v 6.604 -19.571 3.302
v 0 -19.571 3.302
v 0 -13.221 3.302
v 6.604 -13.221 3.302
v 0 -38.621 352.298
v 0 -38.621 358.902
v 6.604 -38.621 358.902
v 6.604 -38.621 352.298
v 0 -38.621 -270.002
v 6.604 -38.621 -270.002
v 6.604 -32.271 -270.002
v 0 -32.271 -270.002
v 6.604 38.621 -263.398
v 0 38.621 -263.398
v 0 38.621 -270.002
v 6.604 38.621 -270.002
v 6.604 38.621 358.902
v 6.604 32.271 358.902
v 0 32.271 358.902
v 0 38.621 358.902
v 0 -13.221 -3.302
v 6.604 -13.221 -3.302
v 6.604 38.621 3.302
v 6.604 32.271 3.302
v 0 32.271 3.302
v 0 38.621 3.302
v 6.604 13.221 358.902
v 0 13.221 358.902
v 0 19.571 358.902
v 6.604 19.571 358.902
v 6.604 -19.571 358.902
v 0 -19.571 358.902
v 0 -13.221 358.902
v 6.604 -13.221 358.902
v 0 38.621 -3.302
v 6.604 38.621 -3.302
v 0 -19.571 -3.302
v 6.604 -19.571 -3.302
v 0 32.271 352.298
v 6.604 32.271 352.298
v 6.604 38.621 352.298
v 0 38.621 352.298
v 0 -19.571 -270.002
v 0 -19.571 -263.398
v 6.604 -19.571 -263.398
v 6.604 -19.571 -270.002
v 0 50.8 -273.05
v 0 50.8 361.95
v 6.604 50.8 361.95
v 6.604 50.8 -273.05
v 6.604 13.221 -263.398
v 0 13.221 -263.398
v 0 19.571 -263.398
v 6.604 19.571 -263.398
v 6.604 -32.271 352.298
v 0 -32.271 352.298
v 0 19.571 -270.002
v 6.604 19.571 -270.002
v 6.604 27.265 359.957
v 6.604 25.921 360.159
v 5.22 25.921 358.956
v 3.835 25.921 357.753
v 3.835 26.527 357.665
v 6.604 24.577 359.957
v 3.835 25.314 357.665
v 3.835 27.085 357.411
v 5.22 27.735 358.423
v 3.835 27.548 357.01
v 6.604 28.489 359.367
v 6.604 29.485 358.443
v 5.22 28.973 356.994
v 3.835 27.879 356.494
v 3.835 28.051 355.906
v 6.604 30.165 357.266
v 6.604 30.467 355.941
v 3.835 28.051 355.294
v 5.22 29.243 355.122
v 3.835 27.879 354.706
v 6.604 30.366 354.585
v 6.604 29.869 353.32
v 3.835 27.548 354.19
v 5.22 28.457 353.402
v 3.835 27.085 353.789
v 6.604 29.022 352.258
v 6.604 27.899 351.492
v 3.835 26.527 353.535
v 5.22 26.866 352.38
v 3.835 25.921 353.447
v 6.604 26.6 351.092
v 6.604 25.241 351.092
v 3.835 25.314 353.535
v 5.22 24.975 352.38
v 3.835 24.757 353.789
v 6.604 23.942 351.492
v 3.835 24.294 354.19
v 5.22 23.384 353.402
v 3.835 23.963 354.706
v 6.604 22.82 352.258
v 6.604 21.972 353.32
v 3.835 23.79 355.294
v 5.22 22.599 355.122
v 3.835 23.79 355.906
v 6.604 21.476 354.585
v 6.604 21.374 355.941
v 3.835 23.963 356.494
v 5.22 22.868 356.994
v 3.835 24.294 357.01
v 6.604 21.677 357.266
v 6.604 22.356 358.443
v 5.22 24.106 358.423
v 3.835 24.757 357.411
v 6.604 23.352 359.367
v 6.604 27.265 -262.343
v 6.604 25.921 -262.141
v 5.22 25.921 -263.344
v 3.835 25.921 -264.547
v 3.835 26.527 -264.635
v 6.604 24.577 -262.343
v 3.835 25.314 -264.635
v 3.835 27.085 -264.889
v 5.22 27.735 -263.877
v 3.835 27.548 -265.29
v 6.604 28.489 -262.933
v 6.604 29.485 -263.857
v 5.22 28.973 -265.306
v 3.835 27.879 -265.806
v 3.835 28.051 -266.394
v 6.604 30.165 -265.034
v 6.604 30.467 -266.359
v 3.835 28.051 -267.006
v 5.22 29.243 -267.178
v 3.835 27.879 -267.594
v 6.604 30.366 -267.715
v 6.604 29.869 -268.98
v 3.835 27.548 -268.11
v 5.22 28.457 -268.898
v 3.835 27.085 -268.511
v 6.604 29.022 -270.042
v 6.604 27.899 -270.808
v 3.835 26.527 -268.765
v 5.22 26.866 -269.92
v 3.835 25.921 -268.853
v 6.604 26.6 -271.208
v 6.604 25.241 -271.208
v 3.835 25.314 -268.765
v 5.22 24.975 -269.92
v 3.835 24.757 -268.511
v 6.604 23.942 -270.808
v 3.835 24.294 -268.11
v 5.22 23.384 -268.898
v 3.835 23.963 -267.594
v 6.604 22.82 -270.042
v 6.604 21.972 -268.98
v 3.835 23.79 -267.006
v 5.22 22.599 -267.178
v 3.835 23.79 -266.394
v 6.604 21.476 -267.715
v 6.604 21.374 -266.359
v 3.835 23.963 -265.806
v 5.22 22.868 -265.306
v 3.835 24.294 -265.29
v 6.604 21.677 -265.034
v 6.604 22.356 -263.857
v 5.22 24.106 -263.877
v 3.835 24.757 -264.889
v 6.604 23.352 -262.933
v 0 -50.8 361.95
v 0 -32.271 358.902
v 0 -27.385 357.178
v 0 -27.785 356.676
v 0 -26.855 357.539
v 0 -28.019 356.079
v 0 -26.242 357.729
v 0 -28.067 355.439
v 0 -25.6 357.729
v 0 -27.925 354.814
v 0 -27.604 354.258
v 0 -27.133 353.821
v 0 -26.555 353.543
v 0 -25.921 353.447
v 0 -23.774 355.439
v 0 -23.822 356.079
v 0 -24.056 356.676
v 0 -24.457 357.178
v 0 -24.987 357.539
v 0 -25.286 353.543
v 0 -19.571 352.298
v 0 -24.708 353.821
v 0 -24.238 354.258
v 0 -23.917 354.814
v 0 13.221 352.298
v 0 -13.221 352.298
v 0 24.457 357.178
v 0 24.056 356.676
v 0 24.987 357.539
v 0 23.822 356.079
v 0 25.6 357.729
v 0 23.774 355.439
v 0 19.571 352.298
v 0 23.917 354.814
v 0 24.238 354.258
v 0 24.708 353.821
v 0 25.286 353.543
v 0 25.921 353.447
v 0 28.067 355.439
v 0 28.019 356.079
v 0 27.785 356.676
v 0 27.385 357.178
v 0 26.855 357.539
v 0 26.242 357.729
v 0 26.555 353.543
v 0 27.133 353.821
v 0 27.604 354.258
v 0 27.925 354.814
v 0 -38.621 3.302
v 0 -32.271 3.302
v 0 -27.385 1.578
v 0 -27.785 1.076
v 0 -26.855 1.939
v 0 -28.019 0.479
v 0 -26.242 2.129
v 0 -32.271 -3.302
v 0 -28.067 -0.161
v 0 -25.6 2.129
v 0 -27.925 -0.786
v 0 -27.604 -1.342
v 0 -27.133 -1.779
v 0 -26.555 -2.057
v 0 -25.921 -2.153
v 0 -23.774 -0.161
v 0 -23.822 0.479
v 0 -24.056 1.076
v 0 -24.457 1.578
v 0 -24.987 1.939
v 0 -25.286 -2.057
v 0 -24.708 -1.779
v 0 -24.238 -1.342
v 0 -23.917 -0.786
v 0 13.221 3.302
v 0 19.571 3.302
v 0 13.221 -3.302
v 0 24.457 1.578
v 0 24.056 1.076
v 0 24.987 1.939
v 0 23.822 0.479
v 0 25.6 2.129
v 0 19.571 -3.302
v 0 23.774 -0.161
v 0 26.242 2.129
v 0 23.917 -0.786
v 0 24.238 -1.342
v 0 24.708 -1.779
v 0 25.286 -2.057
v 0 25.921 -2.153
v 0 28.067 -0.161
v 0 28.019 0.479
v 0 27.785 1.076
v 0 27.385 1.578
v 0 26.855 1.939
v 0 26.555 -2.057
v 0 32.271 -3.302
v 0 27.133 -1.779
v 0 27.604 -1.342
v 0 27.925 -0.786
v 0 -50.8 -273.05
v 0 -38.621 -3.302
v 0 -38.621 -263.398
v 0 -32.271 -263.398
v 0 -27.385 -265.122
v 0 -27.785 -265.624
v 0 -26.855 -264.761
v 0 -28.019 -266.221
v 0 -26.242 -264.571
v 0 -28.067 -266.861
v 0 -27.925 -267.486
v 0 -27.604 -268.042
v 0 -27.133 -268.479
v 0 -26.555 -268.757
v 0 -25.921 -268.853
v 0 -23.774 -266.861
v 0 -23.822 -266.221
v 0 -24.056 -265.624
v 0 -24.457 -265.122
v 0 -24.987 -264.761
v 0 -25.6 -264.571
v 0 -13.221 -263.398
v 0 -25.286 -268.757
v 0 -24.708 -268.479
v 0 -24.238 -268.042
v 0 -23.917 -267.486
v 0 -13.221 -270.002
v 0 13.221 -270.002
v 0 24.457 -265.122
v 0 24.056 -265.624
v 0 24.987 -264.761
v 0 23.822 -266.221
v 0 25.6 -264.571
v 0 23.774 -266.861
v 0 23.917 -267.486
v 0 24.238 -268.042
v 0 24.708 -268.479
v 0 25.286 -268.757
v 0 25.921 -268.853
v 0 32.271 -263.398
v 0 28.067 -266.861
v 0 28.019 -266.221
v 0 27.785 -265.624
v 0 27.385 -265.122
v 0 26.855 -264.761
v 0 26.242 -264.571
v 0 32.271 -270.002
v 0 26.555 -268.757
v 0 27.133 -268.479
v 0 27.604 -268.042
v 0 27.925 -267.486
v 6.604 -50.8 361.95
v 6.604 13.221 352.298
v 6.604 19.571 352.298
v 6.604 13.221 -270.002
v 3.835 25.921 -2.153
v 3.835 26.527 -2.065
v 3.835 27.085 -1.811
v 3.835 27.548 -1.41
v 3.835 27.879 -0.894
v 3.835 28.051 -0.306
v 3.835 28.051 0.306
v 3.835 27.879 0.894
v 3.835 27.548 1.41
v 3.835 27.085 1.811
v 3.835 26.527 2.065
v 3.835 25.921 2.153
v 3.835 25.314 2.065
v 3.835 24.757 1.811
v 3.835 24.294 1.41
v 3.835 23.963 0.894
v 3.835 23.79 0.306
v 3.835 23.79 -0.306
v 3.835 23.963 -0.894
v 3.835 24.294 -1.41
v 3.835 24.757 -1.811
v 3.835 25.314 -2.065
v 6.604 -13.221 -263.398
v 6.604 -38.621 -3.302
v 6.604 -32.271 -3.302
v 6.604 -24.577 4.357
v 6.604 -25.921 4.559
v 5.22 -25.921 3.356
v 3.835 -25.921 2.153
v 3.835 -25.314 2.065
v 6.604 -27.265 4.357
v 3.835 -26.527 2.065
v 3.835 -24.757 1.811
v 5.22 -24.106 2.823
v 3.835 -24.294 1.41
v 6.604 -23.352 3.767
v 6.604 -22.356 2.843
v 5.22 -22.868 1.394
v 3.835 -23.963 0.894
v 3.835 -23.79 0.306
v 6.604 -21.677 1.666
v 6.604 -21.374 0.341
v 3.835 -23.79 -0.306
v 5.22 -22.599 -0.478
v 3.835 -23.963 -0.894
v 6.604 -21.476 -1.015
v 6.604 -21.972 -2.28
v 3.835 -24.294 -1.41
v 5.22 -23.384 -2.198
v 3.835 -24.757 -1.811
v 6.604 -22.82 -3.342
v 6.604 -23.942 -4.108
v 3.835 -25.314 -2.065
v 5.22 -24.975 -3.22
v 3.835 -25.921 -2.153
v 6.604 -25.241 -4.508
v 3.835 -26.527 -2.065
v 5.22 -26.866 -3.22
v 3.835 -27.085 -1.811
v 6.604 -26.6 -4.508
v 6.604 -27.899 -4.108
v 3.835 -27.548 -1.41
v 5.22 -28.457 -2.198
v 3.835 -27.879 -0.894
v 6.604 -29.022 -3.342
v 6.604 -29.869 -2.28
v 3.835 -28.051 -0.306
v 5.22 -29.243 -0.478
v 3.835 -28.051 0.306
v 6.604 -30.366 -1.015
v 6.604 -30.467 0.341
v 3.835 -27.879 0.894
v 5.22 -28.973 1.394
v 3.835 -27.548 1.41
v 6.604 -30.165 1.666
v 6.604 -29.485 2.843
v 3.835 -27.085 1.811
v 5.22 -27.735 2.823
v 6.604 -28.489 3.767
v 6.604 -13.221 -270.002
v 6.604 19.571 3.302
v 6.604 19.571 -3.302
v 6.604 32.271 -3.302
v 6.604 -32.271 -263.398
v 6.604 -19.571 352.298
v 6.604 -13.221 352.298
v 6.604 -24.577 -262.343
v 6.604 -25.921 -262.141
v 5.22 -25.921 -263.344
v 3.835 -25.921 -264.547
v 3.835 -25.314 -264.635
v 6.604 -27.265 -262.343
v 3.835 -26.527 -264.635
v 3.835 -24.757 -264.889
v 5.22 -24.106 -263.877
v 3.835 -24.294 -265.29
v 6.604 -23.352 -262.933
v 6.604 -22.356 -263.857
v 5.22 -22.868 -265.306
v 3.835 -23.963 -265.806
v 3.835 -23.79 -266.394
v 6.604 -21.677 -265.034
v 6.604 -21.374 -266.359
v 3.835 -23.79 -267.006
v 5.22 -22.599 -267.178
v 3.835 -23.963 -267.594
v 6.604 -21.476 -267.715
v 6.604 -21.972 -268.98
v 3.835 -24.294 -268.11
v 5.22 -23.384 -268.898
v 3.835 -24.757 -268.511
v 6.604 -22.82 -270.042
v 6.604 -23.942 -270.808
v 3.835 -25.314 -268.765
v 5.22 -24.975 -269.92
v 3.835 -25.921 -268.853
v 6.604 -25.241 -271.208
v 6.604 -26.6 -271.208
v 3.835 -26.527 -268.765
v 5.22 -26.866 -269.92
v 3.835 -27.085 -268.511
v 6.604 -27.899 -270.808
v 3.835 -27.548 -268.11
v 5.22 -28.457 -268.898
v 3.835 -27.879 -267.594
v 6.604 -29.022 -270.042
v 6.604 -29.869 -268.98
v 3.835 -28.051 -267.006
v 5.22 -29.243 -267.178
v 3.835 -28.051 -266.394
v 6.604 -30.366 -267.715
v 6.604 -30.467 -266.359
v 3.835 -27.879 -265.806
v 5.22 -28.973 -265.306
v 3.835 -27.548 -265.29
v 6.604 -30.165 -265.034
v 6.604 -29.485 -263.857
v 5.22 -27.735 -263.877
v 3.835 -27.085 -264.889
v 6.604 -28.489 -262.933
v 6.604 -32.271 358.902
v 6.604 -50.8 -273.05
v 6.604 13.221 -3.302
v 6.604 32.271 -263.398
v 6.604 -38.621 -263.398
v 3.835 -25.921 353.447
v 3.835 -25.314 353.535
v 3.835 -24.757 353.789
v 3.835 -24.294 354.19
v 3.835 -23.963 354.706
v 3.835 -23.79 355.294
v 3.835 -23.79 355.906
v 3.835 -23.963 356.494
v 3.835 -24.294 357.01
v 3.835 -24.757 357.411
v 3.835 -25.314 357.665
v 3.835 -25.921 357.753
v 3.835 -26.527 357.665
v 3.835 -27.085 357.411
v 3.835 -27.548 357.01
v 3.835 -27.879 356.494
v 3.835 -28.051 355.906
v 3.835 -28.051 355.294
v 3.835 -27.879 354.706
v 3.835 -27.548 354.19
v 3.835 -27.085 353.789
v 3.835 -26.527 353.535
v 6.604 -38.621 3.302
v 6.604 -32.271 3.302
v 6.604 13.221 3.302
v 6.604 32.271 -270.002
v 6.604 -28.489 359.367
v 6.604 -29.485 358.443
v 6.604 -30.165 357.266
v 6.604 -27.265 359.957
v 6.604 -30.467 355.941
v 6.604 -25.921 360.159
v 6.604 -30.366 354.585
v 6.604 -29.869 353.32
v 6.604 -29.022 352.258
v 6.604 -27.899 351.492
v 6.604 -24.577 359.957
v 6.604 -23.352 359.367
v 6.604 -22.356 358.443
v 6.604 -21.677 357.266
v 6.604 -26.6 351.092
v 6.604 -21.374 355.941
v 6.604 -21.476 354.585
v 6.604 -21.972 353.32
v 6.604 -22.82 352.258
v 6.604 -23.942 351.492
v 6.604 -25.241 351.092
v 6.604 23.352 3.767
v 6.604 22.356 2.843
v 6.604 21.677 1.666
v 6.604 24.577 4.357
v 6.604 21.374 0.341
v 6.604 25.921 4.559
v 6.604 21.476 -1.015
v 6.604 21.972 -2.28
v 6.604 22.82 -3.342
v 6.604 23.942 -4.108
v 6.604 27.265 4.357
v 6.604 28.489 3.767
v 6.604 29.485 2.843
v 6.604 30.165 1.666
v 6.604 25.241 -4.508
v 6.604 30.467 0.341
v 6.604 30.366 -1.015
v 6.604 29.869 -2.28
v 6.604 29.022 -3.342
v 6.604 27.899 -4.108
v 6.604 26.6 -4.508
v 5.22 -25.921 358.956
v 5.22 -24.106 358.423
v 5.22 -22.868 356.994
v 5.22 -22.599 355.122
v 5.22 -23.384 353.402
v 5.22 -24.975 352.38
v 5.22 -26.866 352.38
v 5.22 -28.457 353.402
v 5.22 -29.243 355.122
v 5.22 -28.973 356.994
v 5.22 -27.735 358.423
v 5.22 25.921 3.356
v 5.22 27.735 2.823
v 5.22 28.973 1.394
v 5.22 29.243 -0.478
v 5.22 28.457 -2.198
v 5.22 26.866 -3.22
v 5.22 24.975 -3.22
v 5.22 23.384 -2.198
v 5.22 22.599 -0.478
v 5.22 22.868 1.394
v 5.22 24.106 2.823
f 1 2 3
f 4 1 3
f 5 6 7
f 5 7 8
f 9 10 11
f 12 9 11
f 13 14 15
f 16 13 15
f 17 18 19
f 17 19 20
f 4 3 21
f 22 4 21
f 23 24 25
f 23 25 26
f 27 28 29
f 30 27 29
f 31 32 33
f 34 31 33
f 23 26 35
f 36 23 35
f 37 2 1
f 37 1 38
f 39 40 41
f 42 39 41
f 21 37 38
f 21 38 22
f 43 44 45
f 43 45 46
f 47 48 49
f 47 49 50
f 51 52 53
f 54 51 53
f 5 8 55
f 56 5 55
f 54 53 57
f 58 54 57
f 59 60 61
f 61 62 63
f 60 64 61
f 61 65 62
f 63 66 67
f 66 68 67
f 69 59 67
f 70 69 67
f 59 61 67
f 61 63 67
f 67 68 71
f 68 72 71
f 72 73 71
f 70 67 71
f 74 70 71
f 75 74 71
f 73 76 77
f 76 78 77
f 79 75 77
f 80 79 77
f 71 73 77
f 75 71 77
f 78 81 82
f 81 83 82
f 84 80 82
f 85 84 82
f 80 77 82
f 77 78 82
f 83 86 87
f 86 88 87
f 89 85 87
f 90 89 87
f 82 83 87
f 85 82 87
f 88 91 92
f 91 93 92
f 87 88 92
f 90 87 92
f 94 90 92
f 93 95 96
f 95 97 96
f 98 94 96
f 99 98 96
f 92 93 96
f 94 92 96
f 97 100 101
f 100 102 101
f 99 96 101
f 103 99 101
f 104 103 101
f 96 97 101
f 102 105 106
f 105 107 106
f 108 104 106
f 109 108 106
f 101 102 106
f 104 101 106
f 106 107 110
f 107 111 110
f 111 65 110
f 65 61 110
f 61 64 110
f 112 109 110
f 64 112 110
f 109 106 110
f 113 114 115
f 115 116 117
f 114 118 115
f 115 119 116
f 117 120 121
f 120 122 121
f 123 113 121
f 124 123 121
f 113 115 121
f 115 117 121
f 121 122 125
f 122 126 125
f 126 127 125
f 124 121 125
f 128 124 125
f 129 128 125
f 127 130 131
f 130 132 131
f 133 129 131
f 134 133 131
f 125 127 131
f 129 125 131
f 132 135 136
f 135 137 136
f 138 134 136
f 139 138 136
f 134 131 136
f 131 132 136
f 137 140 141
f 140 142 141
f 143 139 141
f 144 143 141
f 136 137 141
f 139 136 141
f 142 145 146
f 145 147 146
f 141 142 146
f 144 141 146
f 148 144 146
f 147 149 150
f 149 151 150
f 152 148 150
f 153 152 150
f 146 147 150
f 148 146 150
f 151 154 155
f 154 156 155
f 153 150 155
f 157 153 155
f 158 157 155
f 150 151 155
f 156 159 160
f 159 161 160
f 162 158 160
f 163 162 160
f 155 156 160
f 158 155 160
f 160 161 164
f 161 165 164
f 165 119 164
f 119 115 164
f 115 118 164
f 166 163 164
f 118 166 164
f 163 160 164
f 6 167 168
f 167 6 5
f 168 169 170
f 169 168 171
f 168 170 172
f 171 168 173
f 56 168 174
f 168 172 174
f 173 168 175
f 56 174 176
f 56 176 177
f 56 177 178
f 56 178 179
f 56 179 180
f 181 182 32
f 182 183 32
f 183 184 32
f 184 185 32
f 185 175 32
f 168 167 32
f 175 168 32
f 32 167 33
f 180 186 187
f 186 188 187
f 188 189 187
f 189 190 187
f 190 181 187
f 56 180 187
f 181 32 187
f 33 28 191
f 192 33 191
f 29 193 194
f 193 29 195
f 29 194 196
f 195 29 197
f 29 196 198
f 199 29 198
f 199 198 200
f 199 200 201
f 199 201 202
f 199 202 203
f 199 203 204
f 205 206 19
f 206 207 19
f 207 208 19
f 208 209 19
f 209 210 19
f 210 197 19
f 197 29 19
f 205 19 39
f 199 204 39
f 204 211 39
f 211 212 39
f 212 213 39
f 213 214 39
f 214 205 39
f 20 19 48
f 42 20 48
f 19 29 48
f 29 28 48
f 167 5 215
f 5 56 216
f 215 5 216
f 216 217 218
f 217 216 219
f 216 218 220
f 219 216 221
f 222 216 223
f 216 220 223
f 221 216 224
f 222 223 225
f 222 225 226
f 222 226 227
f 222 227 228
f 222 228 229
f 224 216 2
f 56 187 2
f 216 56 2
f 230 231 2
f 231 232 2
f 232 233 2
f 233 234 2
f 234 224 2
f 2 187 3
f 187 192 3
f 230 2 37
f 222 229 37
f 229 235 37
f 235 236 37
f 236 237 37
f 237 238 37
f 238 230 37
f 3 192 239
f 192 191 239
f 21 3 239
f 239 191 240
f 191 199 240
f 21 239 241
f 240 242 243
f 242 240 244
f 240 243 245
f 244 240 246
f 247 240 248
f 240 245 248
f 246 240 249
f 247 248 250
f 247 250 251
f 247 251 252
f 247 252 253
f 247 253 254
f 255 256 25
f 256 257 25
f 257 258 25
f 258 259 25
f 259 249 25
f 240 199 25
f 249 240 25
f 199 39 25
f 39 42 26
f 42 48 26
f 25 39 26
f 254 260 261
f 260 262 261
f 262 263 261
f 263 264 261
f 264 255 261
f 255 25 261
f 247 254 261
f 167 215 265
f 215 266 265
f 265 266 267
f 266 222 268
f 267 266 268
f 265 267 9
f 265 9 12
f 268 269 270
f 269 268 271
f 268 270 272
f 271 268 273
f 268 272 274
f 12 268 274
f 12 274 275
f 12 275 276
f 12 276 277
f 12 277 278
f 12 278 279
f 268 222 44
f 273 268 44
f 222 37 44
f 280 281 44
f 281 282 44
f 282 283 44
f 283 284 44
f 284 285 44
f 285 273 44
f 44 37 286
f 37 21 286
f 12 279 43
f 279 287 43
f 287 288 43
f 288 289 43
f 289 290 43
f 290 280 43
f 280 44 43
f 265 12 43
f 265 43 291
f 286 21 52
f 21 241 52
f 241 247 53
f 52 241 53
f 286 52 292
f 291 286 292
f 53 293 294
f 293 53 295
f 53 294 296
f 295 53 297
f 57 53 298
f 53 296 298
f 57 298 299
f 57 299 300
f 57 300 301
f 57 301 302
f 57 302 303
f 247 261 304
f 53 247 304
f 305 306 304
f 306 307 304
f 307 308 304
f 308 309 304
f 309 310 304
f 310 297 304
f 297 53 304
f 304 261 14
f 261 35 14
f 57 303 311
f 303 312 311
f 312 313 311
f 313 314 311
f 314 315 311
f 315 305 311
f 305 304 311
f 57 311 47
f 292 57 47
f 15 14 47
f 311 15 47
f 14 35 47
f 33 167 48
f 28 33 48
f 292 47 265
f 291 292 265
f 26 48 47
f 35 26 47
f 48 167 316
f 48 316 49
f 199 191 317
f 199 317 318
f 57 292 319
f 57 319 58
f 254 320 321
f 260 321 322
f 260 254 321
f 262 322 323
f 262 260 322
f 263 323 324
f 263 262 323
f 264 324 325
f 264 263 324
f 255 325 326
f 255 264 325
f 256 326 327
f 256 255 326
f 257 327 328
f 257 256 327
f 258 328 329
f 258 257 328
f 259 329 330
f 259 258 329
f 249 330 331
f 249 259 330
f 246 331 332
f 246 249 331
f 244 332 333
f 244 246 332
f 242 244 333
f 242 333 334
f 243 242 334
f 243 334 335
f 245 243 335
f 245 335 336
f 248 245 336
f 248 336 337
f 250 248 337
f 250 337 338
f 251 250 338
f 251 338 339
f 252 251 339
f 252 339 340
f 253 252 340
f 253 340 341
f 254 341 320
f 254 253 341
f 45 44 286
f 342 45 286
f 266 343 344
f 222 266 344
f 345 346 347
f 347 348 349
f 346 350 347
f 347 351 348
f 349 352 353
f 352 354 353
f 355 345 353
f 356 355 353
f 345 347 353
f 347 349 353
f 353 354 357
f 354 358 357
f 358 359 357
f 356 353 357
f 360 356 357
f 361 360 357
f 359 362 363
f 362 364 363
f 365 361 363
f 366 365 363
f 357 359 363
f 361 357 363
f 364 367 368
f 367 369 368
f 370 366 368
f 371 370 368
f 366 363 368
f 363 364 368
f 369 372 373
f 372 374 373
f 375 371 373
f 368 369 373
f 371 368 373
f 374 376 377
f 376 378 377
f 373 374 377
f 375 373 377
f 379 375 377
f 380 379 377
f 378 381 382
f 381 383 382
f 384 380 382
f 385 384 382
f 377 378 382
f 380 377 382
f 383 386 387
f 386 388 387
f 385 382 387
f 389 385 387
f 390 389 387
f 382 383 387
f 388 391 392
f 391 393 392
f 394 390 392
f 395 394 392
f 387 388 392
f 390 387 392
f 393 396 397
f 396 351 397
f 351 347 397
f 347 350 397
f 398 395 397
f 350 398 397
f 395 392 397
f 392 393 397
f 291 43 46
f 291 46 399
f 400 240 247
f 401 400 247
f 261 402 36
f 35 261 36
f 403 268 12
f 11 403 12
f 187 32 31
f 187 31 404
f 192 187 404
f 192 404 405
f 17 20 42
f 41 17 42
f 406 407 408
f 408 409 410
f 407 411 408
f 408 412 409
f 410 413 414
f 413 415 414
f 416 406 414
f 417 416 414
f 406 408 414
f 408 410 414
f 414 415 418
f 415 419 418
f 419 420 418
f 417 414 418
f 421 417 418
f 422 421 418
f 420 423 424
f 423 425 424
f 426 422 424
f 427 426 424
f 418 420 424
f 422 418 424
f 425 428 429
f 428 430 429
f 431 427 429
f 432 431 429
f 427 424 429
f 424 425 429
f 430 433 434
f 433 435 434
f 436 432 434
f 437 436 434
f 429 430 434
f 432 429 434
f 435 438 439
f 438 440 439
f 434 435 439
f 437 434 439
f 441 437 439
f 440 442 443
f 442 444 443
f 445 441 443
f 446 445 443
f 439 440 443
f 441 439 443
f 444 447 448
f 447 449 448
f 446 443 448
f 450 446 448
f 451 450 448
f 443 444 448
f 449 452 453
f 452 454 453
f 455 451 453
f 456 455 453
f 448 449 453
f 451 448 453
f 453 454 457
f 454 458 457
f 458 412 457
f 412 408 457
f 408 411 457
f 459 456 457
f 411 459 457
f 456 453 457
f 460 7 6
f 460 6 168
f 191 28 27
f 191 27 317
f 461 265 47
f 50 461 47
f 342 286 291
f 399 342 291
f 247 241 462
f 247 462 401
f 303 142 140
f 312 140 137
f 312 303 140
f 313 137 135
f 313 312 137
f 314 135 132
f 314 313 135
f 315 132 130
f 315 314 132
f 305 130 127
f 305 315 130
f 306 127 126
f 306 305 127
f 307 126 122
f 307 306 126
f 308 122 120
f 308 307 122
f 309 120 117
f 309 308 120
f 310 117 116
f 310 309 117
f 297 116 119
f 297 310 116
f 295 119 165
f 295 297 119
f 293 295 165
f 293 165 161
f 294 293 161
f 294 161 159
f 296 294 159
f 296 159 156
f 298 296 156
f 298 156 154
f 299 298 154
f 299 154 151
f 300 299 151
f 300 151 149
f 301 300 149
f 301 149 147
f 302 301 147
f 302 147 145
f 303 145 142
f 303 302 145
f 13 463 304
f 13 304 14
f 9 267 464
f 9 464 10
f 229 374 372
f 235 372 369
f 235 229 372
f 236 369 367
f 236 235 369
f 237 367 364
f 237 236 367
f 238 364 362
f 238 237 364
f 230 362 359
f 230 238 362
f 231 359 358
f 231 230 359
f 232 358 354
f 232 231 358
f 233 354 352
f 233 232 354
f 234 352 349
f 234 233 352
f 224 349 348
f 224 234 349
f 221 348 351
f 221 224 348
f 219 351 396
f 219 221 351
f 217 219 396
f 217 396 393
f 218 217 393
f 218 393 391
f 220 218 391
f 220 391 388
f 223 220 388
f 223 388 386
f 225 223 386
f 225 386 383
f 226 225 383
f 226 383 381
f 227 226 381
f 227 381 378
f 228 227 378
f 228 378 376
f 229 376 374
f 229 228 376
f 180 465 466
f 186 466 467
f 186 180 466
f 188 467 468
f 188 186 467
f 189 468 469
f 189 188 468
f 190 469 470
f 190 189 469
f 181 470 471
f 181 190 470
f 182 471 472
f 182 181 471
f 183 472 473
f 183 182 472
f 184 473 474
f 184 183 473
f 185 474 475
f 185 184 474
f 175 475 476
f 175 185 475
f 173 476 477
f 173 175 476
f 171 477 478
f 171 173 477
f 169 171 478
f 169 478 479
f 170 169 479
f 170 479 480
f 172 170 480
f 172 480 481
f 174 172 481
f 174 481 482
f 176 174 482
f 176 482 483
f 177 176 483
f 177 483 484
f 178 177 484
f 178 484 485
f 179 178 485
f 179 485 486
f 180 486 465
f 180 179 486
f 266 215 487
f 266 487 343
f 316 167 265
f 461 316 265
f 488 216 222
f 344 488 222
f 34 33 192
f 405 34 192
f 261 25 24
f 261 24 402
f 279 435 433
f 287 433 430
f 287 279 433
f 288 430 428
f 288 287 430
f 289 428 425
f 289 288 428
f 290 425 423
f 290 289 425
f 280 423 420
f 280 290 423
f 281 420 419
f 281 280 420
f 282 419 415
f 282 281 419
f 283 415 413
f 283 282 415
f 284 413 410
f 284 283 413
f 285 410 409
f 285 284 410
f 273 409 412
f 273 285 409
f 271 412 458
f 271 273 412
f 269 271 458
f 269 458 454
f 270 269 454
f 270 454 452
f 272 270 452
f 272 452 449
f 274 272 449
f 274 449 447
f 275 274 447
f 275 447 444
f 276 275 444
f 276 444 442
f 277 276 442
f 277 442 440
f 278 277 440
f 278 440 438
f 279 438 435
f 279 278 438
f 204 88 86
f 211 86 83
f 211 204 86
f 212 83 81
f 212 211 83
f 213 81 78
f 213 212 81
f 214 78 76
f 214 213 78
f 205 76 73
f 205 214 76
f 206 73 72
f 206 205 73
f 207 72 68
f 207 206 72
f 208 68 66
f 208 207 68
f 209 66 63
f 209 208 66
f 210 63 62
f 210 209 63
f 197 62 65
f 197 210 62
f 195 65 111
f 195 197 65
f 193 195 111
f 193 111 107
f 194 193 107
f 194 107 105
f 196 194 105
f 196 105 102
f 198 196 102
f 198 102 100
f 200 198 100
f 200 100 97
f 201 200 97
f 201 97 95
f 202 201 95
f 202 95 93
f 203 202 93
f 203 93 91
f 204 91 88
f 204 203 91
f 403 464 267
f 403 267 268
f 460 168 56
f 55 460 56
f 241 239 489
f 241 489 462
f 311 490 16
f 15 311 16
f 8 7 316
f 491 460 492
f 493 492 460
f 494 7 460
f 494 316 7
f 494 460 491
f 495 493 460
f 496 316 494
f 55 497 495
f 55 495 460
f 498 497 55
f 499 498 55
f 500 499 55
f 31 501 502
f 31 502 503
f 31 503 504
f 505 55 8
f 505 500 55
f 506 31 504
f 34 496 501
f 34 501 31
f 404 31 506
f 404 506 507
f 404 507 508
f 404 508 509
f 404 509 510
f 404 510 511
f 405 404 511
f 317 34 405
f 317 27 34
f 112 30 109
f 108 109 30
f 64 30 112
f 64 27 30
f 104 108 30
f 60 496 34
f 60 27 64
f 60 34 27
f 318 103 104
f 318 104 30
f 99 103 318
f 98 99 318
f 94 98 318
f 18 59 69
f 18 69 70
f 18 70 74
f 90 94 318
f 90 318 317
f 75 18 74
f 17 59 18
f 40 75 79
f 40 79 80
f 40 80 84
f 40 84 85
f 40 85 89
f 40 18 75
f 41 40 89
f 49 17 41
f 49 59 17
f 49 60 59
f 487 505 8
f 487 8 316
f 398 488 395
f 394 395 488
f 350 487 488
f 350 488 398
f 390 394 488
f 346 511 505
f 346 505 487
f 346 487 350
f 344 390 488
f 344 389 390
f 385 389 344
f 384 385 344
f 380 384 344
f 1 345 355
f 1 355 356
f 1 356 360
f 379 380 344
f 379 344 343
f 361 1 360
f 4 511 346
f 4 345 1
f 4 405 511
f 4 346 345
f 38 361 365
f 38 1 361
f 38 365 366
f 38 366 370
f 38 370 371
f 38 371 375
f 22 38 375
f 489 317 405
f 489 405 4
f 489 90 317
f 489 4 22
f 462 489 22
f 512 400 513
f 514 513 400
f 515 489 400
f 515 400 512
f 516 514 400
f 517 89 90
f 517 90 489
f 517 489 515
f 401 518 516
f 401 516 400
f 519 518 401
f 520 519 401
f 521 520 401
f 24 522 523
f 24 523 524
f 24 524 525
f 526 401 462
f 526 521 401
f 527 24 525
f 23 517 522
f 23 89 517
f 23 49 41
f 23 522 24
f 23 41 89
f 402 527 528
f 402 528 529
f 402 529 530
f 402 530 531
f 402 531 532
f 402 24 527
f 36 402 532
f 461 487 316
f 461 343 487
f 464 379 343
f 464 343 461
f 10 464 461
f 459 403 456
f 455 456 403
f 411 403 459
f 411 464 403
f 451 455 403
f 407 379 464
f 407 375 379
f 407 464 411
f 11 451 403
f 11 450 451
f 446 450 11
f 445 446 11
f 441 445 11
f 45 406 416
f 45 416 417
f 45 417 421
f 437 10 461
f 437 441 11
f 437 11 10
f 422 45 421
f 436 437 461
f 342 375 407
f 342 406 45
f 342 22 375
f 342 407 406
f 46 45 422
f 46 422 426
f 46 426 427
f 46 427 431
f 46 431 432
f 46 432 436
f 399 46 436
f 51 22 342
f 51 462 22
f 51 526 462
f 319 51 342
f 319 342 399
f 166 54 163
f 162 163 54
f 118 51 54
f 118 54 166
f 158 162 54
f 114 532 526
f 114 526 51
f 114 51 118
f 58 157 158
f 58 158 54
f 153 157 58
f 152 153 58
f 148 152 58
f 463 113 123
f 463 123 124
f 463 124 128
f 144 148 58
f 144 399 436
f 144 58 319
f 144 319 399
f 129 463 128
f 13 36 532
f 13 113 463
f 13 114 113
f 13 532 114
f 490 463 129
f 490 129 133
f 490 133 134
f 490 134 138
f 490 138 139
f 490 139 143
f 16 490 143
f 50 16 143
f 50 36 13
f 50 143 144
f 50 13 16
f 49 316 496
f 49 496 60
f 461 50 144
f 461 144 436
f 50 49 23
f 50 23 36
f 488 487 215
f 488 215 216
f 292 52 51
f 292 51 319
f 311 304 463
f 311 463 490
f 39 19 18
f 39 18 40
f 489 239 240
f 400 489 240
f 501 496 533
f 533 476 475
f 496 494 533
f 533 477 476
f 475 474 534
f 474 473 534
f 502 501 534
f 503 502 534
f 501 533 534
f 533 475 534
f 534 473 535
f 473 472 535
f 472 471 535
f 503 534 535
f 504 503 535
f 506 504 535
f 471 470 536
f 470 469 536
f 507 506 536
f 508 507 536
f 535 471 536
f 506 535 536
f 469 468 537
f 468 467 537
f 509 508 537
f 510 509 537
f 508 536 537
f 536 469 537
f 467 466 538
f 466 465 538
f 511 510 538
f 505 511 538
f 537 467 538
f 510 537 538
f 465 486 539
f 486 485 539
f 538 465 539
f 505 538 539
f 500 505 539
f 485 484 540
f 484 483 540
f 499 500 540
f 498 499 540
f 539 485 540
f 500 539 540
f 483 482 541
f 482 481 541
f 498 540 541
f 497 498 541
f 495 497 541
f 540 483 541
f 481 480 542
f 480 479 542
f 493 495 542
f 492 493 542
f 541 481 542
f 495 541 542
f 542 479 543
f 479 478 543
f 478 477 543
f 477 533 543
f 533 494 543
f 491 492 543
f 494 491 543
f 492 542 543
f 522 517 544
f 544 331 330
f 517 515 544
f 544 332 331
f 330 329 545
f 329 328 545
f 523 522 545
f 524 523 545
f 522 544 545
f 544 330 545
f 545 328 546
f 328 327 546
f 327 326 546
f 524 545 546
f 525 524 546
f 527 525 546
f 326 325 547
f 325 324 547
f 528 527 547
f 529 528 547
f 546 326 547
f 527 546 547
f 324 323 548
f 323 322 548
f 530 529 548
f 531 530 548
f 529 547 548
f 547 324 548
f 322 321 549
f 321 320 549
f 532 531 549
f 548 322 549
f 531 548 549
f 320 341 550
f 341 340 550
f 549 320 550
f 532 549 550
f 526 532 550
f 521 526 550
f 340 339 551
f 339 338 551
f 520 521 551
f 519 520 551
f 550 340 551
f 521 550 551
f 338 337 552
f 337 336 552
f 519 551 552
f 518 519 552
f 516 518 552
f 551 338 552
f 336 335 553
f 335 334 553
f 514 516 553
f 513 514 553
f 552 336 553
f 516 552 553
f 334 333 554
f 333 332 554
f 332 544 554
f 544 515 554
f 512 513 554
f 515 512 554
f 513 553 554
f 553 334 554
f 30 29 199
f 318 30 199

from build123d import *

# Parameters (mm, degrees)
SKETCH1_W                                         = 635
SKETCH1_H                                         = 101.6
SKETCH1_R                                         = 2.15265
SKETCH1_W_2                                       = 6.604
SKETCH1_H_2                                       = 6.35
BOSS_EXTRUDE1_DEPTH                               = 6.604
CSK_FOR_8_FLAT_HEAD_SOCKET_CAP_SCREW1_D           = 4.3053
CSK_FOR_8_FLAT_HEAD_SOCKET_CAP_SCREW1_CSINK_D     = 9.1186
CSK_FOR_8_FLAT_HEAD_SOCKET_CAP_SCREW1_CSINK_ANGLE = 82


with BuildPart() as part:
    # Sketch1 → Boss-Extrude1 (new body)
    with BuildSketch(Plane(origin=(0, 0, 0), x_dir=(0, 0, -1), z_dir=(1, 0, 0))):
        with Locations((-44.45, 0)):
            Rectangle(SKETCH1_W, SKETCH1_H)
        with Locations((-355.6, 25.9207)):
            Circle(SKETCH1_R, mode=Mode.SUBTRACT)
        with Locations((-355.6, -25.9207)):
            Circle(SKETCH1_R, mode=Mode.SUBTRACT)
        with Locations((0, -25.9207)):
            Circle(SKETCH1_R, mode=Mode.SUBTRACT)
        with Locations((0, 25.9207)):
            Circle(SKETCH1_R, mode=Mode.SUBTRACT)
        with Locations((266.7, -25.9207)):
            Circle(SKETCH1_R, mode=Mode.SUBTRACT)
        with Locations((266.7, 25.9207)):
            Circle(SKETCH1_R, mode=Mode.SUBTRACT)
        with Locations((-355.6, 16.3957)):
            Rectangle(SKETCH1_W_2, SKETCH1_H_2, mode=Mode.SUBTRACT)
        with Locations((-355.6, 35.4457)):
            Rectangle(SKETCH1_W_2, SKETCH1_H_2, mode=Mode.SUBTRACT)
        with Locations((-355.6, -35.4457)):
            Rectangle(SKETCH1_W_2, SKETCH1_H_2, mode=Mode.SUBTRACT)
        with Locations((-355.6, -16.3957)):
            Rectangle(SKETCH1_W_2, SKETCH1_H_2, mode=Mode.SUBTRACT)
        with Locations((0, -16.3957)):
            Rectangle(SKETCH1_W_2, SKETCH1_H_2, mode=Mode.SUBTRACT)
        with Locations((0, -35.4457)):
            Rectangle(SKETCH1_W_2, SKETCH1_H_2, mode=Mode.SUBTRACT)
        with Locations((0, 35.4457)):
            Rectangle(SKETCH1_W_2, SKETCH1_H_2, mode=Mode.SUBTRACT)
        with Locations((0, 16.3957)):
            Rectangle(SKETCH1_W_2, SKETCH1_H_2, mode=Mode.SUBTRACT)
        with Locations((266.7, -16.3957)):
            Rectangle(SKETCH1_W_2, SKETCH1_H_2, mode=Mode.SUBTRACT)
        with Locations((266.7, -35.4457)):
            Rectangle(SKETCH1_W_2, SKETCH1_H_2, mode=Mode.SUBTRACT)
        with Locations((266.7, 35.4457)):
            Rectangle(SKETCH1_W_2, SKETCH1_H_2, mode=Mode.SUBTRACT)
        with Locations((266.7, 16.3957)):
            Rectangle(SKETCH1_W_2, SKETCH1_H_2, mode=Mode.SUBTRACT)
    extrude(amount=BOSS_EXTRUDE1_DEPTH)

    # CSK for #8 Flat Head Socket Cap Screw1 (through all)
    with Locations(Plane(origin=(6.604, 0, 0), x_dir=(0, 0, -1), z_dir=(1, 0, 0))):
        with Locations((-355.6, 25.9207), (-355.6, -25.9207), (0, 25.9207), (0, -25.9207), (266.7, 25.9207), (266.7, -25.9207)):
            CounterSinkHole(CSK_FOR_8_FLAT_HEAD_SOCKET_CAP_SCREW1_D / 2, CSK_FOR_8_FLAT_HEAD_SOCKET_CAP_SCREW1_CSINK_D / 2, counter_sink_angle=CSK_FOR_8_FLAT_HEAD_SOCKET_CAP_SCREW1_CSINK_ANGLE)


solid = part.part
